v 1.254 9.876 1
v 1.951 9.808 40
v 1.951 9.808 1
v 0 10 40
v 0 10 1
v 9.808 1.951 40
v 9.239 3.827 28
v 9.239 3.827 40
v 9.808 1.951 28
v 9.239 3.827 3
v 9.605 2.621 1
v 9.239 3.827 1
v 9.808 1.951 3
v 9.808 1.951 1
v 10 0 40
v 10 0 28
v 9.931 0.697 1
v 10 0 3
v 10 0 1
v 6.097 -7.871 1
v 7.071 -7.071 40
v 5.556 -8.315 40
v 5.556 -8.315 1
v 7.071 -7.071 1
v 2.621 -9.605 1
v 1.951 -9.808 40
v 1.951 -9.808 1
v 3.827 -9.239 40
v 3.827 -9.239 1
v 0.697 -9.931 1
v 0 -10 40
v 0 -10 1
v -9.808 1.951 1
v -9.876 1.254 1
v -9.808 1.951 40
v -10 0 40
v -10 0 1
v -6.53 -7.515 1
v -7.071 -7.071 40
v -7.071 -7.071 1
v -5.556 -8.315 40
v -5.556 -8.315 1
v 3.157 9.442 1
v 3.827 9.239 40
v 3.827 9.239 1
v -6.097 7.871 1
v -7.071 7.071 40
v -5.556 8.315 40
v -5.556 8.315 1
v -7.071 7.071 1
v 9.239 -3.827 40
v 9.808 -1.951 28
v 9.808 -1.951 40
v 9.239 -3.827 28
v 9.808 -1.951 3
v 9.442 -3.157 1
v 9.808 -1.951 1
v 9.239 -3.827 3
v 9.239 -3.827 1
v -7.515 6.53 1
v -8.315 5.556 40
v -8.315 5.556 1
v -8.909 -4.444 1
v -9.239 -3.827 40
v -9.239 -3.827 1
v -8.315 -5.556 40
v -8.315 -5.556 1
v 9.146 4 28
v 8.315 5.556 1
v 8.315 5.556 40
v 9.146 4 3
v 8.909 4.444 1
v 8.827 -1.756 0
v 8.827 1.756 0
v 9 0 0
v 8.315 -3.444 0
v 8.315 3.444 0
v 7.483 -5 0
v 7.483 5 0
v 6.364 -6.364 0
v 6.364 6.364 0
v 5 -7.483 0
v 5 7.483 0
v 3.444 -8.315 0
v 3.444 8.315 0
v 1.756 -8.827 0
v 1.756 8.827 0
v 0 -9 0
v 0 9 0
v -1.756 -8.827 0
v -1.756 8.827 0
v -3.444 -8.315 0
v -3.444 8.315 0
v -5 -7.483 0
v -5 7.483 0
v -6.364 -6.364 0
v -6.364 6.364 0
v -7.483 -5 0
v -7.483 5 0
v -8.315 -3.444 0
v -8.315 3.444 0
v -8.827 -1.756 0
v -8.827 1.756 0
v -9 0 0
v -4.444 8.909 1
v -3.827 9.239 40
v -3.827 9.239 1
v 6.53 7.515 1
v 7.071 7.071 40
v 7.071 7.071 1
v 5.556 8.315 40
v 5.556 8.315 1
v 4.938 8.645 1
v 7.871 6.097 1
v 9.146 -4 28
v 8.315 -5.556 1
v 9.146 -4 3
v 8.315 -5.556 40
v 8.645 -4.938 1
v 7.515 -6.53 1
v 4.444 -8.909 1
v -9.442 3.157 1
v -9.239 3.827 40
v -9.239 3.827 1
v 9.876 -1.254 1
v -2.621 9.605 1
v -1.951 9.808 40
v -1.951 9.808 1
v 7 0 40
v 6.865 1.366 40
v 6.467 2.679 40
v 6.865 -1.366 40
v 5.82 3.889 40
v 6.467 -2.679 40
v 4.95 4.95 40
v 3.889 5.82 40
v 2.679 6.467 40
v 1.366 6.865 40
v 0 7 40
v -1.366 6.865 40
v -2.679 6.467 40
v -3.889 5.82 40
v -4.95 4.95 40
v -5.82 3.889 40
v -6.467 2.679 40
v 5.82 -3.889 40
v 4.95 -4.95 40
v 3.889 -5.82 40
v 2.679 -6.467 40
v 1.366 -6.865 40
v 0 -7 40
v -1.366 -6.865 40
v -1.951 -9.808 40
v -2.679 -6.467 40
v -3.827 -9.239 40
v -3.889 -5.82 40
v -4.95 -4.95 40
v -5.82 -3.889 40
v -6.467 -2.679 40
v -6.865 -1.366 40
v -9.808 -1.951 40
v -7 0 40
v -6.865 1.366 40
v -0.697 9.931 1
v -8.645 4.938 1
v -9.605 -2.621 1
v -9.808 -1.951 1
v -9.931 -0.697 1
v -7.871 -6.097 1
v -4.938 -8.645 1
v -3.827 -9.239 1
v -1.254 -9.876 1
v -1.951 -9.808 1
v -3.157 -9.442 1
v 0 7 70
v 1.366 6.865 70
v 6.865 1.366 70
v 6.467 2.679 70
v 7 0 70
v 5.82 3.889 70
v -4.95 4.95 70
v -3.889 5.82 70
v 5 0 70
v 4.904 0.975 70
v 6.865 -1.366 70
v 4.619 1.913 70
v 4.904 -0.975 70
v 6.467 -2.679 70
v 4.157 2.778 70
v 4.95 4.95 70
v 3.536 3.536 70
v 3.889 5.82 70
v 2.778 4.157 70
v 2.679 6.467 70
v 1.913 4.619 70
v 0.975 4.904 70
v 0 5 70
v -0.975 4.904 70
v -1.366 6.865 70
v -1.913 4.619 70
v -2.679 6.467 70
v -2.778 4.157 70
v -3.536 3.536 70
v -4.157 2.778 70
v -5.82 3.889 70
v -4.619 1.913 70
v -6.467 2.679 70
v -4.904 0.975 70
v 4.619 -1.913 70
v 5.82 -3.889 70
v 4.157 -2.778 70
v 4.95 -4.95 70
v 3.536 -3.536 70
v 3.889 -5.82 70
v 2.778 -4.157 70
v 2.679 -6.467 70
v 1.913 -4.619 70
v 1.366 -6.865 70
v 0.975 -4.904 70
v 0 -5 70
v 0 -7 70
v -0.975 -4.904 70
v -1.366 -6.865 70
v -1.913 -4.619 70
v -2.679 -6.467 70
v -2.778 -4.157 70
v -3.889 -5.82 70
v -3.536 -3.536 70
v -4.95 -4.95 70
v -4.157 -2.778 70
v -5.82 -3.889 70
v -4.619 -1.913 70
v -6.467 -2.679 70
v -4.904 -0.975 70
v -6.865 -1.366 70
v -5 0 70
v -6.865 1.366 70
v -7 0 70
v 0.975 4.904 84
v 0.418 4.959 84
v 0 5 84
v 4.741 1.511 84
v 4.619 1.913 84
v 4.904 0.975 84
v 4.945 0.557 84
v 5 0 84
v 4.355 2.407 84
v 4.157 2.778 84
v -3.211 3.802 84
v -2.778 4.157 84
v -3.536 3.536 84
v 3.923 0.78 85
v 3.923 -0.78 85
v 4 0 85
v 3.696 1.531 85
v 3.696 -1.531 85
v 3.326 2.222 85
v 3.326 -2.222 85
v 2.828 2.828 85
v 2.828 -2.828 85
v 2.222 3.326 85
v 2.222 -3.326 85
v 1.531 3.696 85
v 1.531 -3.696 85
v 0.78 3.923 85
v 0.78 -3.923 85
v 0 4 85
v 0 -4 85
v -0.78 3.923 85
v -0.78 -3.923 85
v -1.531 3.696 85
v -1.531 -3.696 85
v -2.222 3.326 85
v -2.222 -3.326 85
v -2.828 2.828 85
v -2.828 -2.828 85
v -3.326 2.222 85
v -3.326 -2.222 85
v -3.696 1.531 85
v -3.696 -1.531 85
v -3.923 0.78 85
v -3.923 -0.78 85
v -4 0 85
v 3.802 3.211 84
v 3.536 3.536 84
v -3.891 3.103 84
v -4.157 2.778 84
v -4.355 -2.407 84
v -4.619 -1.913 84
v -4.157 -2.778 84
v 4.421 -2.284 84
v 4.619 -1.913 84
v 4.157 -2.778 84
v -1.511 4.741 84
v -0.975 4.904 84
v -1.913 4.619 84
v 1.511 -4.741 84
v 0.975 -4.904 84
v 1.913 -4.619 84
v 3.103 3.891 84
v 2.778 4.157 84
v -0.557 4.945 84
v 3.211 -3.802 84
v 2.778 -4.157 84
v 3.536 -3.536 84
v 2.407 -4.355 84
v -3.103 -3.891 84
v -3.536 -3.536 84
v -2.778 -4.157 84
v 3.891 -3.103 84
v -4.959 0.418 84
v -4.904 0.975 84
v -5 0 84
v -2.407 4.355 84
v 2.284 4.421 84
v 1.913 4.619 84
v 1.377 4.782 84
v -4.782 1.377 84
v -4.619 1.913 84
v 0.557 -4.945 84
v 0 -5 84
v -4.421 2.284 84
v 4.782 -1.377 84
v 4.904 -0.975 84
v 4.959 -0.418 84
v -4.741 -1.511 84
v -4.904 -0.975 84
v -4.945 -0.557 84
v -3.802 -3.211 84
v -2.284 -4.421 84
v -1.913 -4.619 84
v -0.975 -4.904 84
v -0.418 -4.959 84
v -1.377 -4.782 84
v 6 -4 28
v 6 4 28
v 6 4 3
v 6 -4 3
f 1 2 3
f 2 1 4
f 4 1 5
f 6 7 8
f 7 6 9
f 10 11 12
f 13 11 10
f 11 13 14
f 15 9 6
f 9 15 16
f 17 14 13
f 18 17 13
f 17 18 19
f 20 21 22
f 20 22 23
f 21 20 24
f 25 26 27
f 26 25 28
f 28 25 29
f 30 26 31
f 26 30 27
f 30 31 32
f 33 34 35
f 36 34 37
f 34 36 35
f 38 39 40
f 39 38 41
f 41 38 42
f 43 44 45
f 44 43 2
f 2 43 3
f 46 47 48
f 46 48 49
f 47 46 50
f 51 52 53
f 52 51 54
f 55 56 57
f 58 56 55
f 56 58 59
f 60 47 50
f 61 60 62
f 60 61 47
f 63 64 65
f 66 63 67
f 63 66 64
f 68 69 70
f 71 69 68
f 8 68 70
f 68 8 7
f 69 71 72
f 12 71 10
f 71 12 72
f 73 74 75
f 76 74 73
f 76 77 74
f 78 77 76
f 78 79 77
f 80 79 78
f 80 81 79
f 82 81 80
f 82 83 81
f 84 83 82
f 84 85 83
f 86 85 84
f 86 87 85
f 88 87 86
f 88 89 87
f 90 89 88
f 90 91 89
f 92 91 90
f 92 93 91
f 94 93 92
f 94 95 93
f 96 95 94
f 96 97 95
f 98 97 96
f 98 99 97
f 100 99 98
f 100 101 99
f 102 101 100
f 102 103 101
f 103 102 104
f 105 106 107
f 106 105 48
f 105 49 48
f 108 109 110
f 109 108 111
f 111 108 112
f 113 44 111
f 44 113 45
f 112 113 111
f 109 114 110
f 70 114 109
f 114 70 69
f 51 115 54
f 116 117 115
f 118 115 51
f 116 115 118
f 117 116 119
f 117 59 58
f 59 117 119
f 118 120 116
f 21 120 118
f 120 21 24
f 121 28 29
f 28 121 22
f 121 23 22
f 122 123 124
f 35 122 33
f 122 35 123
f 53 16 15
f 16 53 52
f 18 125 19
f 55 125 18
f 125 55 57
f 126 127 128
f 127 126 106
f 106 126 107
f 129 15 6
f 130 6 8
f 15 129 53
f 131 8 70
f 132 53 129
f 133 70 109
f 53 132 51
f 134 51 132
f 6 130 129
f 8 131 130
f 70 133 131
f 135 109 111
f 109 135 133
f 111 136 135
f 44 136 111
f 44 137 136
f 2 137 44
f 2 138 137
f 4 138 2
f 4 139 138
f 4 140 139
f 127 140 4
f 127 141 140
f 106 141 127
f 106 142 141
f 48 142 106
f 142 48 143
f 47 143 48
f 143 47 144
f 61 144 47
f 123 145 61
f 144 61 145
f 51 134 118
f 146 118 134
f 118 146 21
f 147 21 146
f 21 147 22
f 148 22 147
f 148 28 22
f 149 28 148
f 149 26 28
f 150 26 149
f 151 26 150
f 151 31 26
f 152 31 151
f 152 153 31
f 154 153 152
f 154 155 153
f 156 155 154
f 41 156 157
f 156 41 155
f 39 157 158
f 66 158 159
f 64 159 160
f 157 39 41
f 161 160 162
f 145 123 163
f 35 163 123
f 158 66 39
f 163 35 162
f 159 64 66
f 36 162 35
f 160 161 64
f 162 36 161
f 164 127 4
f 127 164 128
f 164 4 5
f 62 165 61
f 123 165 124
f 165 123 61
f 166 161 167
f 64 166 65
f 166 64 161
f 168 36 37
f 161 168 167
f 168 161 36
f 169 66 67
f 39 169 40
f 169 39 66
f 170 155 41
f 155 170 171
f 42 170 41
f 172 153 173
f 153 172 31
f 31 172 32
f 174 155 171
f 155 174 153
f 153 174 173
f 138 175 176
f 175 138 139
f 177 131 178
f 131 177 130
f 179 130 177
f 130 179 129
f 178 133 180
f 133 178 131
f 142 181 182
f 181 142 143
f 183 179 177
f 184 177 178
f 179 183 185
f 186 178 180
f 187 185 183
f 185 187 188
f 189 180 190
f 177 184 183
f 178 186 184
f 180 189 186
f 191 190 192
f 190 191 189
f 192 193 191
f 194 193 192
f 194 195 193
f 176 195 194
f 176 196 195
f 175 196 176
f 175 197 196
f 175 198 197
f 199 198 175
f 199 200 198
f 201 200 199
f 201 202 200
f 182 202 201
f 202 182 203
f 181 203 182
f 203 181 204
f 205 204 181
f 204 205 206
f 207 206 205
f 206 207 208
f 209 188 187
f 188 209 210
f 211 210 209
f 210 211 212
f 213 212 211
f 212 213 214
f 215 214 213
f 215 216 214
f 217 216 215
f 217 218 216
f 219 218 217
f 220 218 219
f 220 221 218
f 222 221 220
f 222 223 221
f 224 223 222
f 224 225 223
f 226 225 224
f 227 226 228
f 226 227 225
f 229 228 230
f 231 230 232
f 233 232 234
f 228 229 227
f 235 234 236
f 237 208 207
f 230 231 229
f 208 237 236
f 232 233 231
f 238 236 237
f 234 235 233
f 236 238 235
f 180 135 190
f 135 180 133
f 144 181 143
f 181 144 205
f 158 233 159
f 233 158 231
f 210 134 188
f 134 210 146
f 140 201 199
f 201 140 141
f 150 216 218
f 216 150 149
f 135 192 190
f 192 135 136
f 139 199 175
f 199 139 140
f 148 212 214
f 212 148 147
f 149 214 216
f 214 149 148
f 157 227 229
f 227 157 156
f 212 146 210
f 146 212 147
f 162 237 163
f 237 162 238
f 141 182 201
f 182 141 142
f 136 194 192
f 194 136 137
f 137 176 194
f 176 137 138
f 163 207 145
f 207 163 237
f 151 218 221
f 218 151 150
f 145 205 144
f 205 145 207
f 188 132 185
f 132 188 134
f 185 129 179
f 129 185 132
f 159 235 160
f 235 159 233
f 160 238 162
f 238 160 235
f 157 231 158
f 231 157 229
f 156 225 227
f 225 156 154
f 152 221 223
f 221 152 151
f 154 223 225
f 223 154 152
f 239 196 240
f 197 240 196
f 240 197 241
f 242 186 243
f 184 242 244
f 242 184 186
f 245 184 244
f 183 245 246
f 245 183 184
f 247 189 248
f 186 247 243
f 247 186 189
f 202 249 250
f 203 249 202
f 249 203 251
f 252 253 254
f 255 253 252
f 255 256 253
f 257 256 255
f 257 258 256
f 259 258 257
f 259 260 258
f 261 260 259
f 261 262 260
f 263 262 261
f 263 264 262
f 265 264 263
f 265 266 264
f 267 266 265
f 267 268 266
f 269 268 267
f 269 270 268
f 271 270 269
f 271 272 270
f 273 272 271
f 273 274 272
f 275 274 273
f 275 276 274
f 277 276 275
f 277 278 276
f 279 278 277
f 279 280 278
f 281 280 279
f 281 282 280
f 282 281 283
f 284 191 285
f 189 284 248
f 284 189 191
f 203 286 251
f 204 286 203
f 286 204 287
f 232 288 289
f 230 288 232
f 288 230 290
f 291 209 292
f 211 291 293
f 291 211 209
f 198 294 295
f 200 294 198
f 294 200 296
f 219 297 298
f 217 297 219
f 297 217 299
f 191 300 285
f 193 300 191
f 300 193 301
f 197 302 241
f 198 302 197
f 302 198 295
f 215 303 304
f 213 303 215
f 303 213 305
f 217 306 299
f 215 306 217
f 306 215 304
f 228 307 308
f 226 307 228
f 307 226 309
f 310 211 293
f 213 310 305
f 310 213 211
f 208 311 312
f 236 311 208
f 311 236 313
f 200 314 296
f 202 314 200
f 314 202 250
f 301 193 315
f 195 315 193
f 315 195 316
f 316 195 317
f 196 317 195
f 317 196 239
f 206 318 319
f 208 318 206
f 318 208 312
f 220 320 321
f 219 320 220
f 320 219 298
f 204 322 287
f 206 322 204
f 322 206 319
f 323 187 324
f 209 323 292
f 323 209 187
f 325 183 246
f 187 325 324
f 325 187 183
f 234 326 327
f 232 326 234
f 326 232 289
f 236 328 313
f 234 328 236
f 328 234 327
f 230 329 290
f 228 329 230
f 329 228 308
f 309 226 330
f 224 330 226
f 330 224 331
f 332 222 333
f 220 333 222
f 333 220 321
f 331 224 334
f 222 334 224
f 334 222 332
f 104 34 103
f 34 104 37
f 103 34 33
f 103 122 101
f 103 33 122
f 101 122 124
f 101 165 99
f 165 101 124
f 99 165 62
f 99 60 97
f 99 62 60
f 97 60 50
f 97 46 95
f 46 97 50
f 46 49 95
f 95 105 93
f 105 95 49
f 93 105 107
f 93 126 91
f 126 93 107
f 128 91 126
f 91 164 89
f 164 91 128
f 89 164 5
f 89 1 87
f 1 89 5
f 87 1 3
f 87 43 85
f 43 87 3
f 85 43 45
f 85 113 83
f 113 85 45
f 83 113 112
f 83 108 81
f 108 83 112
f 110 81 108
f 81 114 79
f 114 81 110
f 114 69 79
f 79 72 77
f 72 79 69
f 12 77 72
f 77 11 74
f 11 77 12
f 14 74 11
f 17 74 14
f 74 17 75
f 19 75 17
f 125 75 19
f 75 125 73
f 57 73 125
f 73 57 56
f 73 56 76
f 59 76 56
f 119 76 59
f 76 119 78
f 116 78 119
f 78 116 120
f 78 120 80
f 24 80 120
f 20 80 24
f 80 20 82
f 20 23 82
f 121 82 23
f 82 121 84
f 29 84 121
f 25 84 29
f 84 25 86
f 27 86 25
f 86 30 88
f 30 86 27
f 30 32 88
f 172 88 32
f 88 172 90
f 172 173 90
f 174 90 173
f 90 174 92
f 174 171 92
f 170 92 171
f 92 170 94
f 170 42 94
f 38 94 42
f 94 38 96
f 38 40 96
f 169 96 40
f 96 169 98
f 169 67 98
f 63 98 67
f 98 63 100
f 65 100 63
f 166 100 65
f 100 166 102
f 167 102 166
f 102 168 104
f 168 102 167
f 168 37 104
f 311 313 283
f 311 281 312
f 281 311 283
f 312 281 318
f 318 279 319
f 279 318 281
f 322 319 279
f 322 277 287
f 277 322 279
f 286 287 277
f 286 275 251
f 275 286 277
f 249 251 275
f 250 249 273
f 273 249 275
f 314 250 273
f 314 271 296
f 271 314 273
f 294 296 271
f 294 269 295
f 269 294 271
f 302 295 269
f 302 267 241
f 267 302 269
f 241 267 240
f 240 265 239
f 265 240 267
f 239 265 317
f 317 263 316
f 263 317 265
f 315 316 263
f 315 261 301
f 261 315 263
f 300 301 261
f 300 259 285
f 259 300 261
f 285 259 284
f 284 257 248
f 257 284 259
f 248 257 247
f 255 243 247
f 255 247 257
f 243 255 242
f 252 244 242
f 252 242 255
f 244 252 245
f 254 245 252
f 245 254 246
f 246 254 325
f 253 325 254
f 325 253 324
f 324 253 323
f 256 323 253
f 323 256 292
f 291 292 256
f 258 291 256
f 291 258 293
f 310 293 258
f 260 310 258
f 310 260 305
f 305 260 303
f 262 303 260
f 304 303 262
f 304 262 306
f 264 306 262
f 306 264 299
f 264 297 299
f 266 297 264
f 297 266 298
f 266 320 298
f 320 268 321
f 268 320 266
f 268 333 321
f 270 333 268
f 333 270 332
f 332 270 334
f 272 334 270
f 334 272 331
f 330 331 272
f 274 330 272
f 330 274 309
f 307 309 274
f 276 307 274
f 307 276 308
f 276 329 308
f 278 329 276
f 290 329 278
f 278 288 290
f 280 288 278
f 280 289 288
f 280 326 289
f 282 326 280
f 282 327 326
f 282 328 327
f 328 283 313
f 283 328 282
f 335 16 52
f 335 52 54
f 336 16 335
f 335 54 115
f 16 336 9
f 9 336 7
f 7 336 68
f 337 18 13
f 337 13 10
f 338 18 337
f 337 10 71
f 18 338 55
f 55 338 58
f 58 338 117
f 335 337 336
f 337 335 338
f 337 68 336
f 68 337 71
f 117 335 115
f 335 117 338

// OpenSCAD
$fn = 32;

// ----------------------------------------------------------------------
// Stepped shaft: diameters 20, 14, 10 mm, 85 mm long
// ----------------------------------------------------------------------

// --- parameters (mm) ---
d1 = 20;                  // step 1 diameter
len1 = 40;                // step 1 length
d2 = 14;                  // step 2 diameter
len2 = 30;                // step 2 length
d3 = 10;                  // step 3 diameter
len3 = 15;                // step 3 length
total = 85;               // overall length
chamfer = 1;              // end chamfer
key_w = 8;                // keyway width
key_d = 4;                // keyway depth
key_len = 25;             // keyway length
key_z = 3;                // keyway start along the shaft

difference() {
  /* turned body: stacked cylinders, every step sunk into the bigger one */
  union() {
    cylinder(h = len1, d = d1);
    translate([0, 0, 39.6]) cylinder(h = 30.4, d = d2);
    translate([0, 0, 69.6]) cylinder(h = 15.4, d = d3);
  }
  /* bottom chamfer ring cut */
  rotate_extrude() translate([9, -2.5]) polygon([[0, 0], [3.5, 0], [3.5, 6], [0, 2.5]]);
  /* top chamfer ring cut */
  rotate_extrude() translate([4, 85]) polygon([[0, 0], [3.5, -3.5], [3.5, 2.5], [0, 2.5]]);
  /* keyway milled along the first step */
  translate([d1 / 2 - key_d, -key_w / 2, key_z]) cube([key_d + 2.5, key_w, key_len]);
}
